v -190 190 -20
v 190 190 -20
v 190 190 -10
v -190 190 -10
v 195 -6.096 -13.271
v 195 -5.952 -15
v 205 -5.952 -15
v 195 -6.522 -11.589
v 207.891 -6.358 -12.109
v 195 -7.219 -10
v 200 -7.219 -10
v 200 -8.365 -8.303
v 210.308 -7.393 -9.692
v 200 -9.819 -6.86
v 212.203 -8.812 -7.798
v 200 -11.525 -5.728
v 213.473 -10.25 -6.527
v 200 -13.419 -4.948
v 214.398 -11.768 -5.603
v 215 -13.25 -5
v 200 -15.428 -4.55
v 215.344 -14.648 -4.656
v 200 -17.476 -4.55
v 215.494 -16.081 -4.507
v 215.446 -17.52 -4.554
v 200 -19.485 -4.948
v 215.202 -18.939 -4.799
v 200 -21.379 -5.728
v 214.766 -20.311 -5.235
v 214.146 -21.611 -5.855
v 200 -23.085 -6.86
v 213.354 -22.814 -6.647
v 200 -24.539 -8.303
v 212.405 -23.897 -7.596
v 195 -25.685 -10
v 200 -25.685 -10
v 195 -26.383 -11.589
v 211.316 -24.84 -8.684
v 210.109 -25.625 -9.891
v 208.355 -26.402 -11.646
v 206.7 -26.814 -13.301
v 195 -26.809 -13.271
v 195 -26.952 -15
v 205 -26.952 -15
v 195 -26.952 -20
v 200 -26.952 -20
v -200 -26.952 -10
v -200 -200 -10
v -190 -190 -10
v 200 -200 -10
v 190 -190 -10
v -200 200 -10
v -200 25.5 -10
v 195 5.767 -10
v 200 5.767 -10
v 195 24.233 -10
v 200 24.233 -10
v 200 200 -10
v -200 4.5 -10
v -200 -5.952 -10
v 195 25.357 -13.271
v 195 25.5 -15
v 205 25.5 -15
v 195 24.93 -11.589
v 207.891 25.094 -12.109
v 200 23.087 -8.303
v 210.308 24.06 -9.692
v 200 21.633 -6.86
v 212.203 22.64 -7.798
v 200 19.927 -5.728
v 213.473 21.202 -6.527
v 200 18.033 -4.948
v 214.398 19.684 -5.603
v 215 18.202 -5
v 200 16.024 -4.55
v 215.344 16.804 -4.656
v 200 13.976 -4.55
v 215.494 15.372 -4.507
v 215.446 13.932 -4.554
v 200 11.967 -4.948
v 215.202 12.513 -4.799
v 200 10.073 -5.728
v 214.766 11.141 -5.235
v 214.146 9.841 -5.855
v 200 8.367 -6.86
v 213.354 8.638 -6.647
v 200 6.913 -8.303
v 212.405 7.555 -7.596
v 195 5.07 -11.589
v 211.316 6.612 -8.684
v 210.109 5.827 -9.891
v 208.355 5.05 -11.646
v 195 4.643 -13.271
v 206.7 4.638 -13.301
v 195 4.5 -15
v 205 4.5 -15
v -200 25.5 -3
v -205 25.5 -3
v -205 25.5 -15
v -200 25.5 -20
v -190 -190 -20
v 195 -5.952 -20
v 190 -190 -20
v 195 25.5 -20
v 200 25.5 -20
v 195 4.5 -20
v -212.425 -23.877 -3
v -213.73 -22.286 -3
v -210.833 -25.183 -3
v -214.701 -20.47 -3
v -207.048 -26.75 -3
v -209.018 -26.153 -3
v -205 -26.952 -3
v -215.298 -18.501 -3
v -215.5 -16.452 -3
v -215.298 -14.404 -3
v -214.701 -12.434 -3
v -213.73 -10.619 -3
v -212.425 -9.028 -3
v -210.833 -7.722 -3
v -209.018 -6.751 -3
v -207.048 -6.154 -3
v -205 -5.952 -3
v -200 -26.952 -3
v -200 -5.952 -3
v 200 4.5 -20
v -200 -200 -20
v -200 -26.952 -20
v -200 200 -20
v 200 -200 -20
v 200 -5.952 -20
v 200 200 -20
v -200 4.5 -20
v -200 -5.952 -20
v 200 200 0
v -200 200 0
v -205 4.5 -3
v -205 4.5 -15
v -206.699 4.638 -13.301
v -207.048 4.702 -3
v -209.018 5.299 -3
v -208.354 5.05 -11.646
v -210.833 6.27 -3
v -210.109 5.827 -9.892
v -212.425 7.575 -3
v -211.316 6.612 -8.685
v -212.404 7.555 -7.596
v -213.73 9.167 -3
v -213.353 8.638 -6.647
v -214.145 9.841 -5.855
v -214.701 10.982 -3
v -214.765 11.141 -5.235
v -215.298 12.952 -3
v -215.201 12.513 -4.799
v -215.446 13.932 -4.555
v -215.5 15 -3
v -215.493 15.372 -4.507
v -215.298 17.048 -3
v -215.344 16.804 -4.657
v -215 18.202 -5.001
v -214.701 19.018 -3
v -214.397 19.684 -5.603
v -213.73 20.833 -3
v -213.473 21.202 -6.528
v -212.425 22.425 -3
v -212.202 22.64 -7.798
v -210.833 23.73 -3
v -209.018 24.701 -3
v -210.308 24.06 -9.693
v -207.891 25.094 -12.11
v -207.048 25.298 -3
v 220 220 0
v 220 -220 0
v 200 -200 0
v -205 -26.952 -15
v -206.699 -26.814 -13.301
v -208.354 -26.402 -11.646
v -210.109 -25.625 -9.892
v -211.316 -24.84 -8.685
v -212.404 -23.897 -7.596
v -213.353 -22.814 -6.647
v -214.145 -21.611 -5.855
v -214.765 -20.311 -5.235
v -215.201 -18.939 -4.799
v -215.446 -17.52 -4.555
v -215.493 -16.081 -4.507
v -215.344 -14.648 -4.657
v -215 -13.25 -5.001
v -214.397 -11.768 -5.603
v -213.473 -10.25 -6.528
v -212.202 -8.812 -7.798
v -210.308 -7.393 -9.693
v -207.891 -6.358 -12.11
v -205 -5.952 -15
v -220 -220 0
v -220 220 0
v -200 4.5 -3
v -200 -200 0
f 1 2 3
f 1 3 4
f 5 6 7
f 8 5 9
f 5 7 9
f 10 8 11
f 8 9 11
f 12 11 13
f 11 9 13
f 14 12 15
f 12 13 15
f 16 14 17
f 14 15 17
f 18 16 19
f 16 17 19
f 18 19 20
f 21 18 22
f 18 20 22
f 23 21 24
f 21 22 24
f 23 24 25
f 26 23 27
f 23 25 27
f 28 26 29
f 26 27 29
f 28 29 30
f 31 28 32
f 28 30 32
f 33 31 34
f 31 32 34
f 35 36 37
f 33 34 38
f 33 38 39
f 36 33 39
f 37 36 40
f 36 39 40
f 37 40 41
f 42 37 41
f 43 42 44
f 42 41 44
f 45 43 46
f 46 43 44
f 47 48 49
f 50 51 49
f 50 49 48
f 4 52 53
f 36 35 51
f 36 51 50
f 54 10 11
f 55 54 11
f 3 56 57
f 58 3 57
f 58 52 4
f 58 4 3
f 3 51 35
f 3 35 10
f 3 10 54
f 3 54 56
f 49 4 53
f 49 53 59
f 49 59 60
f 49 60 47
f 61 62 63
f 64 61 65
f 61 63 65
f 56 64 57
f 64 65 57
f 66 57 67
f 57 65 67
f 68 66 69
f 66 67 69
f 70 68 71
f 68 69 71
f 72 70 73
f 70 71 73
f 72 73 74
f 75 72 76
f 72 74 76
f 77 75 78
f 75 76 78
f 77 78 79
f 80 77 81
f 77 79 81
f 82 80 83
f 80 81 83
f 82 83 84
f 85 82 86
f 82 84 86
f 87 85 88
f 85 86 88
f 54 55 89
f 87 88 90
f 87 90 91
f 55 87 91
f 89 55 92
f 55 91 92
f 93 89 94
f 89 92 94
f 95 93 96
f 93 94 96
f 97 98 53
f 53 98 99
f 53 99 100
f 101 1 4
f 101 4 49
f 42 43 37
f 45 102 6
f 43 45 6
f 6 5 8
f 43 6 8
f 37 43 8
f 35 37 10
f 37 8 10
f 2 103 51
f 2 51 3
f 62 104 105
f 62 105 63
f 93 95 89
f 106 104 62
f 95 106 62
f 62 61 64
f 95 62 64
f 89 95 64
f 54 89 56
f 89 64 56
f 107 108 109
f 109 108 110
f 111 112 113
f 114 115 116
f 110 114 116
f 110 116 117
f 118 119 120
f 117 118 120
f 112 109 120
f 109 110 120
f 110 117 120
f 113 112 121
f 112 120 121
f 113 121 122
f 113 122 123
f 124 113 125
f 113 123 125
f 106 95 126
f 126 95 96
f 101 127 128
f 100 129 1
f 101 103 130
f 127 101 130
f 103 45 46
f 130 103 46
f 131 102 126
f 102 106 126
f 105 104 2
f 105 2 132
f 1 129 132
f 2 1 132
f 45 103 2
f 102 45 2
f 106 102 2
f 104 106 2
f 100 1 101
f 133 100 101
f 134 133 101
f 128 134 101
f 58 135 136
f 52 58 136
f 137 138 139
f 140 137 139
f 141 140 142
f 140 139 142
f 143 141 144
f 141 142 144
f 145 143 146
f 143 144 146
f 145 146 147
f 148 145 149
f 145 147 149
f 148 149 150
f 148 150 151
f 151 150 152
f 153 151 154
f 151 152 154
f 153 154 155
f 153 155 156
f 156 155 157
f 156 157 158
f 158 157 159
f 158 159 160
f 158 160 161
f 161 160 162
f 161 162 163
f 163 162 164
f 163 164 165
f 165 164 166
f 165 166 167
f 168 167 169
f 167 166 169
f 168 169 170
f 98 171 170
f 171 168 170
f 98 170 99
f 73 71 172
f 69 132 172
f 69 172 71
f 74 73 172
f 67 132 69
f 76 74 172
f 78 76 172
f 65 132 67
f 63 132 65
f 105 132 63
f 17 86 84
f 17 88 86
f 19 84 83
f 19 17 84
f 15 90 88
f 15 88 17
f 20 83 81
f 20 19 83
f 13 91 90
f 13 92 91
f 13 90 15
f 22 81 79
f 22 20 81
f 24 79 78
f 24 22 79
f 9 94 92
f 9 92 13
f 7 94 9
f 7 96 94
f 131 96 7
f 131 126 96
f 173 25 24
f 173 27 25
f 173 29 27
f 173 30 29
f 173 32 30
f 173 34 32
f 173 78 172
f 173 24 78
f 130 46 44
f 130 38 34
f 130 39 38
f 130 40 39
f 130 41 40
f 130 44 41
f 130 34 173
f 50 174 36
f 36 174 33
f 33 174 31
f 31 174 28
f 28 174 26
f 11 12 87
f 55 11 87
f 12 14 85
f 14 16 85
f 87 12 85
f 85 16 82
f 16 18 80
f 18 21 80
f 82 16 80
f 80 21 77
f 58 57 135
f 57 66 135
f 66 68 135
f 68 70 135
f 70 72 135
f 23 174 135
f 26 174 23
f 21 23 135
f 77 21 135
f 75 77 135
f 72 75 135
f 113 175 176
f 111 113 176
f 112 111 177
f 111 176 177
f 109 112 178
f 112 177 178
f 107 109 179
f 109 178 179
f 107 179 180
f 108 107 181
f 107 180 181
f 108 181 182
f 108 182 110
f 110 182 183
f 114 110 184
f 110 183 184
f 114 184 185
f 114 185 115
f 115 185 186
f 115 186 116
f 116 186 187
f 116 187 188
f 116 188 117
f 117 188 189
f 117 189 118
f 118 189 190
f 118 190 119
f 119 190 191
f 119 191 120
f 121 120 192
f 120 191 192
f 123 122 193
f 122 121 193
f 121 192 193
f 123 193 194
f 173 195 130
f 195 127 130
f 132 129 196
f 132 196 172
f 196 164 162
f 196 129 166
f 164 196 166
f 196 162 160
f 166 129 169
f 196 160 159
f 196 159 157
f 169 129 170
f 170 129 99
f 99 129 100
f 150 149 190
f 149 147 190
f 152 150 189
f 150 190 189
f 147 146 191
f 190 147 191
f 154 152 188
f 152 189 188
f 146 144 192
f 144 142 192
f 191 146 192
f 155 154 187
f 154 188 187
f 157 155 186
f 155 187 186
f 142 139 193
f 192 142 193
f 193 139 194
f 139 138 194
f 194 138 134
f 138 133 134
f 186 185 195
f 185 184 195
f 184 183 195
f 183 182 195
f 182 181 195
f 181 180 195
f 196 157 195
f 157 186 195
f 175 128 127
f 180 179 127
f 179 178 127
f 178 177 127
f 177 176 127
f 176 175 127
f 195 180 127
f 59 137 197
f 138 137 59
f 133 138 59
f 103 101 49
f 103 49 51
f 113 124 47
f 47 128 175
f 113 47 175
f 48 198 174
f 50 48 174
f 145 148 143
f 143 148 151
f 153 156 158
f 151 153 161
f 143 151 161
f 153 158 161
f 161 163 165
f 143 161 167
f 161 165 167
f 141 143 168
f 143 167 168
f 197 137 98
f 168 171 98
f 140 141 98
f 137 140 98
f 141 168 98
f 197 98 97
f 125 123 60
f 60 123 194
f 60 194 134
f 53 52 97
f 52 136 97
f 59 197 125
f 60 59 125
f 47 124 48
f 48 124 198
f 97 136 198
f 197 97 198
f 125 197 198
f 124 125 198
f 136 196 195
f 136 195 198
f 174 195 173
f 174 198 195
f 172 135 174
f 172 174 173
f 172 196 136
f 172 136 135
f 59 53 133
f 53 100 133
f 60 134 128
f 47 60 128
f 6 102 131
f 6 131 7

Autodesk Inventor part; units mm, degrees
ref_plane "YZ Plane" through (0, 0, 0) normal (1, 0, 0) x (0, 1, 0)
ref_plane "XZ Plane" through (0, 0, 0) normal (0, 1, 0) x (-1, 0, 0)
ref_plane "XY Plane" through (0, 0, 0) normal (0, 0, 1) x (1, 0, 0)
sketch "Skizze1" plane through (0, 0, 0) normal (0, 0, 1) x (1, 0, 0)
  line L0 (-220, -220) -> (220, -220) projected
  line L1 (220, 220) -> (220, -220) projected
  line L2 (-220, 220) -> (-220, -220) projected
  line L3 (-220, 220) -> (220, 220) projected
  line L4 (200, 200) -> (-200, 200) projected
  line L5 (-200, 200) -> (-200, -200) projected
  line L6 (-200, -200) -> (200, -200) projected
  line L7 (200, -200) -> (200, 200) projected
  line L8 (220, -220) -> (-220, -220)
  line L9 (-220, -220) -> (-220, 220)
  line L10 (-220, 220) -> (220, 220)
  line L11 (220, 220) -> (220, -220)
  line L12 (200, -200) -> (-200, -200)
  line L13 (-200, -200) -> (-200, 200)
  line L14 (-200, 200) -> (200, 200)
  line L15 (200, 200) -> (200, -200)
  point P0 (0, 0)
extrude "Extrusion1" add sketch "Skizze1" against normal blind 20
chamfer "Fase1" distance 20 angle 45 4 edges at (220, 0, -20) (0, 220, -20) (0, -220, -20) (-220, 0, -20)
ref_plane "Arbeitsebene1" through (0, 0, -20) normal (0, 0, 1) x (1, 0, 0)
sketch "Skizze3" plane through (0, 0, -20) normal (0, 0, 1) x (1, 0, 0)
  arc A0 (-205, 25.5) -> (-205, 4.5) centre (-205, 15) ccw projected
  arc A1 (-205, 25.5) -> (-205, 4.5) centre (-205, 15) ccw projected
  arc A2 (-205, -5.9522) -> (-205, -26.9522) centre (-205, -16.4522) ccw projected
  arc A3 (-205, -5.9522) -> (-205, -26.9522) centre (-205, -16.4522) ccw projected
  arc A4 (-205, -5.9522) -> (-205, -26.9522) centre (-205, -16.4522) ccw projected
  arc A5 (-205, -5.9522) -> (-205, -26.9522) centre (-205, -16.4522) ccw projected
  line L0 (-200, -26.9522) -> (-205, -26.9522) projected
  line L1 (-205, -5.9522) -> (-200, -5.9522) projected
  line L2 (-205, 4.5) -> (-200, 4.5)
  line L3 (-200, -200) -> (-200, 200) projected
  line L4 (-205, 25.5) -> (-200, 25.5)
  line L5 (-205, -5.9522) -> (-200, -5.9522)
  line L6 (-205, -26.9522) -> (-200, -26.9522)
  arc A6 (-205, 25.5) -> (-205, 4.5) centre (-205, 15) ccw
  arc A7 (-205, -5.9522) -> (-205, -26.9522) centre (-205, -16.4522) ccw
  point P0 (0, 0)
extrude "Extrusion2" cut sketch "Skizze3" along normal blind 17
sketch "Skizze5" plane through (0, 0, -20) normal (0, 0, 1) x (1, 0, 0)
  line L0 (-200, -26.9522) -> (-200, -200) projected
  line L1 (-200, -200) -> (200, -200) projected
  line L2 (200, -200) -> (200, 200) projected
  line L3 (-200, 200) -> (200, 200) projected
  line L4 (-200, -200) -> (200, -200)
  line L5 (200, -200) -> (200, 200)
  line L6 (200, 200) -> (-200, 200)
  line L7 (-200, 200) -> (-200, -200)
  line L8 (-190, -190) -> (190, -190)
  line L9 (190, -190) -> (190, 190)
  line L10 (190, 190) -> (-190, 190)
  line L11 (-190, 190) -> (-190, -190)
  point P0 (0, 0)
  dimension "d8" = 10
  dimension "d9" = 10
  dimension "d10" = 10
  dimension "d11" = 10
extrude "Extrusion3" add sketch "Skizze5" along normal blind 10
ref_plane "Arbeitsebene3" through (220, -220, -440) normal (-1, 0, 0) x (0, 0, 1)
sketch "Skizze6" plane through (220, -220, -440) normal (-1, 0, 0) x (0, 0, 1)
  arc A0 (425, 193.0478) -> (425, 214.0478) centre (425, 203.5478) ccw projected
  arc A1 (425, 224.5) -> (425, 245.5) centre (425, 235) ccw projected
  line L0 (425, 224.5) -> (420, 224.5) projected
  line L1 (420, 214.0478) -> (425, 214.0478) projected
  line L2 (425, 193.0478) -> (420, 193.0478) projected
  line L3 (420, 245.5) -> (425, 245.5) projected
  line L4 (420, 193.0478) -> (430, 193.0478) projected
  line L5 (420, 193.0478) -> (425, 193.0478)
  line L6 (420, 214.0478) -> (425, 214.0478)
  line L7 (430, 214.0478) -> (420, 214.0478) projected
  line L8 (420, 245.5) -> (420, 224.5) projected
  line L9 (420, 224.5) -> (425, 224.5)
  line L10 (420, 245.5) -> (425, 245.5)
  line L11 (420, 193.0478) -> (420, 20) projected
  line L12 (420, 193.0478) -> (420, 214.0478)
  line L13 (420, 224.5) -> (420, 245.5)
  arc A2 (425, 193.0478) -> (425, 214.0478) centre (425, 203.5478) ccw
  arc A3 (425, 224.5) -> (425, 245.5) centre (425, 235) ccw
  point P0 (440, 220)
extrude "Extrusion4" cut sketch "Skizze6" along normal blind 25
properties part number "PV_Ramen_CPY_3_21"
